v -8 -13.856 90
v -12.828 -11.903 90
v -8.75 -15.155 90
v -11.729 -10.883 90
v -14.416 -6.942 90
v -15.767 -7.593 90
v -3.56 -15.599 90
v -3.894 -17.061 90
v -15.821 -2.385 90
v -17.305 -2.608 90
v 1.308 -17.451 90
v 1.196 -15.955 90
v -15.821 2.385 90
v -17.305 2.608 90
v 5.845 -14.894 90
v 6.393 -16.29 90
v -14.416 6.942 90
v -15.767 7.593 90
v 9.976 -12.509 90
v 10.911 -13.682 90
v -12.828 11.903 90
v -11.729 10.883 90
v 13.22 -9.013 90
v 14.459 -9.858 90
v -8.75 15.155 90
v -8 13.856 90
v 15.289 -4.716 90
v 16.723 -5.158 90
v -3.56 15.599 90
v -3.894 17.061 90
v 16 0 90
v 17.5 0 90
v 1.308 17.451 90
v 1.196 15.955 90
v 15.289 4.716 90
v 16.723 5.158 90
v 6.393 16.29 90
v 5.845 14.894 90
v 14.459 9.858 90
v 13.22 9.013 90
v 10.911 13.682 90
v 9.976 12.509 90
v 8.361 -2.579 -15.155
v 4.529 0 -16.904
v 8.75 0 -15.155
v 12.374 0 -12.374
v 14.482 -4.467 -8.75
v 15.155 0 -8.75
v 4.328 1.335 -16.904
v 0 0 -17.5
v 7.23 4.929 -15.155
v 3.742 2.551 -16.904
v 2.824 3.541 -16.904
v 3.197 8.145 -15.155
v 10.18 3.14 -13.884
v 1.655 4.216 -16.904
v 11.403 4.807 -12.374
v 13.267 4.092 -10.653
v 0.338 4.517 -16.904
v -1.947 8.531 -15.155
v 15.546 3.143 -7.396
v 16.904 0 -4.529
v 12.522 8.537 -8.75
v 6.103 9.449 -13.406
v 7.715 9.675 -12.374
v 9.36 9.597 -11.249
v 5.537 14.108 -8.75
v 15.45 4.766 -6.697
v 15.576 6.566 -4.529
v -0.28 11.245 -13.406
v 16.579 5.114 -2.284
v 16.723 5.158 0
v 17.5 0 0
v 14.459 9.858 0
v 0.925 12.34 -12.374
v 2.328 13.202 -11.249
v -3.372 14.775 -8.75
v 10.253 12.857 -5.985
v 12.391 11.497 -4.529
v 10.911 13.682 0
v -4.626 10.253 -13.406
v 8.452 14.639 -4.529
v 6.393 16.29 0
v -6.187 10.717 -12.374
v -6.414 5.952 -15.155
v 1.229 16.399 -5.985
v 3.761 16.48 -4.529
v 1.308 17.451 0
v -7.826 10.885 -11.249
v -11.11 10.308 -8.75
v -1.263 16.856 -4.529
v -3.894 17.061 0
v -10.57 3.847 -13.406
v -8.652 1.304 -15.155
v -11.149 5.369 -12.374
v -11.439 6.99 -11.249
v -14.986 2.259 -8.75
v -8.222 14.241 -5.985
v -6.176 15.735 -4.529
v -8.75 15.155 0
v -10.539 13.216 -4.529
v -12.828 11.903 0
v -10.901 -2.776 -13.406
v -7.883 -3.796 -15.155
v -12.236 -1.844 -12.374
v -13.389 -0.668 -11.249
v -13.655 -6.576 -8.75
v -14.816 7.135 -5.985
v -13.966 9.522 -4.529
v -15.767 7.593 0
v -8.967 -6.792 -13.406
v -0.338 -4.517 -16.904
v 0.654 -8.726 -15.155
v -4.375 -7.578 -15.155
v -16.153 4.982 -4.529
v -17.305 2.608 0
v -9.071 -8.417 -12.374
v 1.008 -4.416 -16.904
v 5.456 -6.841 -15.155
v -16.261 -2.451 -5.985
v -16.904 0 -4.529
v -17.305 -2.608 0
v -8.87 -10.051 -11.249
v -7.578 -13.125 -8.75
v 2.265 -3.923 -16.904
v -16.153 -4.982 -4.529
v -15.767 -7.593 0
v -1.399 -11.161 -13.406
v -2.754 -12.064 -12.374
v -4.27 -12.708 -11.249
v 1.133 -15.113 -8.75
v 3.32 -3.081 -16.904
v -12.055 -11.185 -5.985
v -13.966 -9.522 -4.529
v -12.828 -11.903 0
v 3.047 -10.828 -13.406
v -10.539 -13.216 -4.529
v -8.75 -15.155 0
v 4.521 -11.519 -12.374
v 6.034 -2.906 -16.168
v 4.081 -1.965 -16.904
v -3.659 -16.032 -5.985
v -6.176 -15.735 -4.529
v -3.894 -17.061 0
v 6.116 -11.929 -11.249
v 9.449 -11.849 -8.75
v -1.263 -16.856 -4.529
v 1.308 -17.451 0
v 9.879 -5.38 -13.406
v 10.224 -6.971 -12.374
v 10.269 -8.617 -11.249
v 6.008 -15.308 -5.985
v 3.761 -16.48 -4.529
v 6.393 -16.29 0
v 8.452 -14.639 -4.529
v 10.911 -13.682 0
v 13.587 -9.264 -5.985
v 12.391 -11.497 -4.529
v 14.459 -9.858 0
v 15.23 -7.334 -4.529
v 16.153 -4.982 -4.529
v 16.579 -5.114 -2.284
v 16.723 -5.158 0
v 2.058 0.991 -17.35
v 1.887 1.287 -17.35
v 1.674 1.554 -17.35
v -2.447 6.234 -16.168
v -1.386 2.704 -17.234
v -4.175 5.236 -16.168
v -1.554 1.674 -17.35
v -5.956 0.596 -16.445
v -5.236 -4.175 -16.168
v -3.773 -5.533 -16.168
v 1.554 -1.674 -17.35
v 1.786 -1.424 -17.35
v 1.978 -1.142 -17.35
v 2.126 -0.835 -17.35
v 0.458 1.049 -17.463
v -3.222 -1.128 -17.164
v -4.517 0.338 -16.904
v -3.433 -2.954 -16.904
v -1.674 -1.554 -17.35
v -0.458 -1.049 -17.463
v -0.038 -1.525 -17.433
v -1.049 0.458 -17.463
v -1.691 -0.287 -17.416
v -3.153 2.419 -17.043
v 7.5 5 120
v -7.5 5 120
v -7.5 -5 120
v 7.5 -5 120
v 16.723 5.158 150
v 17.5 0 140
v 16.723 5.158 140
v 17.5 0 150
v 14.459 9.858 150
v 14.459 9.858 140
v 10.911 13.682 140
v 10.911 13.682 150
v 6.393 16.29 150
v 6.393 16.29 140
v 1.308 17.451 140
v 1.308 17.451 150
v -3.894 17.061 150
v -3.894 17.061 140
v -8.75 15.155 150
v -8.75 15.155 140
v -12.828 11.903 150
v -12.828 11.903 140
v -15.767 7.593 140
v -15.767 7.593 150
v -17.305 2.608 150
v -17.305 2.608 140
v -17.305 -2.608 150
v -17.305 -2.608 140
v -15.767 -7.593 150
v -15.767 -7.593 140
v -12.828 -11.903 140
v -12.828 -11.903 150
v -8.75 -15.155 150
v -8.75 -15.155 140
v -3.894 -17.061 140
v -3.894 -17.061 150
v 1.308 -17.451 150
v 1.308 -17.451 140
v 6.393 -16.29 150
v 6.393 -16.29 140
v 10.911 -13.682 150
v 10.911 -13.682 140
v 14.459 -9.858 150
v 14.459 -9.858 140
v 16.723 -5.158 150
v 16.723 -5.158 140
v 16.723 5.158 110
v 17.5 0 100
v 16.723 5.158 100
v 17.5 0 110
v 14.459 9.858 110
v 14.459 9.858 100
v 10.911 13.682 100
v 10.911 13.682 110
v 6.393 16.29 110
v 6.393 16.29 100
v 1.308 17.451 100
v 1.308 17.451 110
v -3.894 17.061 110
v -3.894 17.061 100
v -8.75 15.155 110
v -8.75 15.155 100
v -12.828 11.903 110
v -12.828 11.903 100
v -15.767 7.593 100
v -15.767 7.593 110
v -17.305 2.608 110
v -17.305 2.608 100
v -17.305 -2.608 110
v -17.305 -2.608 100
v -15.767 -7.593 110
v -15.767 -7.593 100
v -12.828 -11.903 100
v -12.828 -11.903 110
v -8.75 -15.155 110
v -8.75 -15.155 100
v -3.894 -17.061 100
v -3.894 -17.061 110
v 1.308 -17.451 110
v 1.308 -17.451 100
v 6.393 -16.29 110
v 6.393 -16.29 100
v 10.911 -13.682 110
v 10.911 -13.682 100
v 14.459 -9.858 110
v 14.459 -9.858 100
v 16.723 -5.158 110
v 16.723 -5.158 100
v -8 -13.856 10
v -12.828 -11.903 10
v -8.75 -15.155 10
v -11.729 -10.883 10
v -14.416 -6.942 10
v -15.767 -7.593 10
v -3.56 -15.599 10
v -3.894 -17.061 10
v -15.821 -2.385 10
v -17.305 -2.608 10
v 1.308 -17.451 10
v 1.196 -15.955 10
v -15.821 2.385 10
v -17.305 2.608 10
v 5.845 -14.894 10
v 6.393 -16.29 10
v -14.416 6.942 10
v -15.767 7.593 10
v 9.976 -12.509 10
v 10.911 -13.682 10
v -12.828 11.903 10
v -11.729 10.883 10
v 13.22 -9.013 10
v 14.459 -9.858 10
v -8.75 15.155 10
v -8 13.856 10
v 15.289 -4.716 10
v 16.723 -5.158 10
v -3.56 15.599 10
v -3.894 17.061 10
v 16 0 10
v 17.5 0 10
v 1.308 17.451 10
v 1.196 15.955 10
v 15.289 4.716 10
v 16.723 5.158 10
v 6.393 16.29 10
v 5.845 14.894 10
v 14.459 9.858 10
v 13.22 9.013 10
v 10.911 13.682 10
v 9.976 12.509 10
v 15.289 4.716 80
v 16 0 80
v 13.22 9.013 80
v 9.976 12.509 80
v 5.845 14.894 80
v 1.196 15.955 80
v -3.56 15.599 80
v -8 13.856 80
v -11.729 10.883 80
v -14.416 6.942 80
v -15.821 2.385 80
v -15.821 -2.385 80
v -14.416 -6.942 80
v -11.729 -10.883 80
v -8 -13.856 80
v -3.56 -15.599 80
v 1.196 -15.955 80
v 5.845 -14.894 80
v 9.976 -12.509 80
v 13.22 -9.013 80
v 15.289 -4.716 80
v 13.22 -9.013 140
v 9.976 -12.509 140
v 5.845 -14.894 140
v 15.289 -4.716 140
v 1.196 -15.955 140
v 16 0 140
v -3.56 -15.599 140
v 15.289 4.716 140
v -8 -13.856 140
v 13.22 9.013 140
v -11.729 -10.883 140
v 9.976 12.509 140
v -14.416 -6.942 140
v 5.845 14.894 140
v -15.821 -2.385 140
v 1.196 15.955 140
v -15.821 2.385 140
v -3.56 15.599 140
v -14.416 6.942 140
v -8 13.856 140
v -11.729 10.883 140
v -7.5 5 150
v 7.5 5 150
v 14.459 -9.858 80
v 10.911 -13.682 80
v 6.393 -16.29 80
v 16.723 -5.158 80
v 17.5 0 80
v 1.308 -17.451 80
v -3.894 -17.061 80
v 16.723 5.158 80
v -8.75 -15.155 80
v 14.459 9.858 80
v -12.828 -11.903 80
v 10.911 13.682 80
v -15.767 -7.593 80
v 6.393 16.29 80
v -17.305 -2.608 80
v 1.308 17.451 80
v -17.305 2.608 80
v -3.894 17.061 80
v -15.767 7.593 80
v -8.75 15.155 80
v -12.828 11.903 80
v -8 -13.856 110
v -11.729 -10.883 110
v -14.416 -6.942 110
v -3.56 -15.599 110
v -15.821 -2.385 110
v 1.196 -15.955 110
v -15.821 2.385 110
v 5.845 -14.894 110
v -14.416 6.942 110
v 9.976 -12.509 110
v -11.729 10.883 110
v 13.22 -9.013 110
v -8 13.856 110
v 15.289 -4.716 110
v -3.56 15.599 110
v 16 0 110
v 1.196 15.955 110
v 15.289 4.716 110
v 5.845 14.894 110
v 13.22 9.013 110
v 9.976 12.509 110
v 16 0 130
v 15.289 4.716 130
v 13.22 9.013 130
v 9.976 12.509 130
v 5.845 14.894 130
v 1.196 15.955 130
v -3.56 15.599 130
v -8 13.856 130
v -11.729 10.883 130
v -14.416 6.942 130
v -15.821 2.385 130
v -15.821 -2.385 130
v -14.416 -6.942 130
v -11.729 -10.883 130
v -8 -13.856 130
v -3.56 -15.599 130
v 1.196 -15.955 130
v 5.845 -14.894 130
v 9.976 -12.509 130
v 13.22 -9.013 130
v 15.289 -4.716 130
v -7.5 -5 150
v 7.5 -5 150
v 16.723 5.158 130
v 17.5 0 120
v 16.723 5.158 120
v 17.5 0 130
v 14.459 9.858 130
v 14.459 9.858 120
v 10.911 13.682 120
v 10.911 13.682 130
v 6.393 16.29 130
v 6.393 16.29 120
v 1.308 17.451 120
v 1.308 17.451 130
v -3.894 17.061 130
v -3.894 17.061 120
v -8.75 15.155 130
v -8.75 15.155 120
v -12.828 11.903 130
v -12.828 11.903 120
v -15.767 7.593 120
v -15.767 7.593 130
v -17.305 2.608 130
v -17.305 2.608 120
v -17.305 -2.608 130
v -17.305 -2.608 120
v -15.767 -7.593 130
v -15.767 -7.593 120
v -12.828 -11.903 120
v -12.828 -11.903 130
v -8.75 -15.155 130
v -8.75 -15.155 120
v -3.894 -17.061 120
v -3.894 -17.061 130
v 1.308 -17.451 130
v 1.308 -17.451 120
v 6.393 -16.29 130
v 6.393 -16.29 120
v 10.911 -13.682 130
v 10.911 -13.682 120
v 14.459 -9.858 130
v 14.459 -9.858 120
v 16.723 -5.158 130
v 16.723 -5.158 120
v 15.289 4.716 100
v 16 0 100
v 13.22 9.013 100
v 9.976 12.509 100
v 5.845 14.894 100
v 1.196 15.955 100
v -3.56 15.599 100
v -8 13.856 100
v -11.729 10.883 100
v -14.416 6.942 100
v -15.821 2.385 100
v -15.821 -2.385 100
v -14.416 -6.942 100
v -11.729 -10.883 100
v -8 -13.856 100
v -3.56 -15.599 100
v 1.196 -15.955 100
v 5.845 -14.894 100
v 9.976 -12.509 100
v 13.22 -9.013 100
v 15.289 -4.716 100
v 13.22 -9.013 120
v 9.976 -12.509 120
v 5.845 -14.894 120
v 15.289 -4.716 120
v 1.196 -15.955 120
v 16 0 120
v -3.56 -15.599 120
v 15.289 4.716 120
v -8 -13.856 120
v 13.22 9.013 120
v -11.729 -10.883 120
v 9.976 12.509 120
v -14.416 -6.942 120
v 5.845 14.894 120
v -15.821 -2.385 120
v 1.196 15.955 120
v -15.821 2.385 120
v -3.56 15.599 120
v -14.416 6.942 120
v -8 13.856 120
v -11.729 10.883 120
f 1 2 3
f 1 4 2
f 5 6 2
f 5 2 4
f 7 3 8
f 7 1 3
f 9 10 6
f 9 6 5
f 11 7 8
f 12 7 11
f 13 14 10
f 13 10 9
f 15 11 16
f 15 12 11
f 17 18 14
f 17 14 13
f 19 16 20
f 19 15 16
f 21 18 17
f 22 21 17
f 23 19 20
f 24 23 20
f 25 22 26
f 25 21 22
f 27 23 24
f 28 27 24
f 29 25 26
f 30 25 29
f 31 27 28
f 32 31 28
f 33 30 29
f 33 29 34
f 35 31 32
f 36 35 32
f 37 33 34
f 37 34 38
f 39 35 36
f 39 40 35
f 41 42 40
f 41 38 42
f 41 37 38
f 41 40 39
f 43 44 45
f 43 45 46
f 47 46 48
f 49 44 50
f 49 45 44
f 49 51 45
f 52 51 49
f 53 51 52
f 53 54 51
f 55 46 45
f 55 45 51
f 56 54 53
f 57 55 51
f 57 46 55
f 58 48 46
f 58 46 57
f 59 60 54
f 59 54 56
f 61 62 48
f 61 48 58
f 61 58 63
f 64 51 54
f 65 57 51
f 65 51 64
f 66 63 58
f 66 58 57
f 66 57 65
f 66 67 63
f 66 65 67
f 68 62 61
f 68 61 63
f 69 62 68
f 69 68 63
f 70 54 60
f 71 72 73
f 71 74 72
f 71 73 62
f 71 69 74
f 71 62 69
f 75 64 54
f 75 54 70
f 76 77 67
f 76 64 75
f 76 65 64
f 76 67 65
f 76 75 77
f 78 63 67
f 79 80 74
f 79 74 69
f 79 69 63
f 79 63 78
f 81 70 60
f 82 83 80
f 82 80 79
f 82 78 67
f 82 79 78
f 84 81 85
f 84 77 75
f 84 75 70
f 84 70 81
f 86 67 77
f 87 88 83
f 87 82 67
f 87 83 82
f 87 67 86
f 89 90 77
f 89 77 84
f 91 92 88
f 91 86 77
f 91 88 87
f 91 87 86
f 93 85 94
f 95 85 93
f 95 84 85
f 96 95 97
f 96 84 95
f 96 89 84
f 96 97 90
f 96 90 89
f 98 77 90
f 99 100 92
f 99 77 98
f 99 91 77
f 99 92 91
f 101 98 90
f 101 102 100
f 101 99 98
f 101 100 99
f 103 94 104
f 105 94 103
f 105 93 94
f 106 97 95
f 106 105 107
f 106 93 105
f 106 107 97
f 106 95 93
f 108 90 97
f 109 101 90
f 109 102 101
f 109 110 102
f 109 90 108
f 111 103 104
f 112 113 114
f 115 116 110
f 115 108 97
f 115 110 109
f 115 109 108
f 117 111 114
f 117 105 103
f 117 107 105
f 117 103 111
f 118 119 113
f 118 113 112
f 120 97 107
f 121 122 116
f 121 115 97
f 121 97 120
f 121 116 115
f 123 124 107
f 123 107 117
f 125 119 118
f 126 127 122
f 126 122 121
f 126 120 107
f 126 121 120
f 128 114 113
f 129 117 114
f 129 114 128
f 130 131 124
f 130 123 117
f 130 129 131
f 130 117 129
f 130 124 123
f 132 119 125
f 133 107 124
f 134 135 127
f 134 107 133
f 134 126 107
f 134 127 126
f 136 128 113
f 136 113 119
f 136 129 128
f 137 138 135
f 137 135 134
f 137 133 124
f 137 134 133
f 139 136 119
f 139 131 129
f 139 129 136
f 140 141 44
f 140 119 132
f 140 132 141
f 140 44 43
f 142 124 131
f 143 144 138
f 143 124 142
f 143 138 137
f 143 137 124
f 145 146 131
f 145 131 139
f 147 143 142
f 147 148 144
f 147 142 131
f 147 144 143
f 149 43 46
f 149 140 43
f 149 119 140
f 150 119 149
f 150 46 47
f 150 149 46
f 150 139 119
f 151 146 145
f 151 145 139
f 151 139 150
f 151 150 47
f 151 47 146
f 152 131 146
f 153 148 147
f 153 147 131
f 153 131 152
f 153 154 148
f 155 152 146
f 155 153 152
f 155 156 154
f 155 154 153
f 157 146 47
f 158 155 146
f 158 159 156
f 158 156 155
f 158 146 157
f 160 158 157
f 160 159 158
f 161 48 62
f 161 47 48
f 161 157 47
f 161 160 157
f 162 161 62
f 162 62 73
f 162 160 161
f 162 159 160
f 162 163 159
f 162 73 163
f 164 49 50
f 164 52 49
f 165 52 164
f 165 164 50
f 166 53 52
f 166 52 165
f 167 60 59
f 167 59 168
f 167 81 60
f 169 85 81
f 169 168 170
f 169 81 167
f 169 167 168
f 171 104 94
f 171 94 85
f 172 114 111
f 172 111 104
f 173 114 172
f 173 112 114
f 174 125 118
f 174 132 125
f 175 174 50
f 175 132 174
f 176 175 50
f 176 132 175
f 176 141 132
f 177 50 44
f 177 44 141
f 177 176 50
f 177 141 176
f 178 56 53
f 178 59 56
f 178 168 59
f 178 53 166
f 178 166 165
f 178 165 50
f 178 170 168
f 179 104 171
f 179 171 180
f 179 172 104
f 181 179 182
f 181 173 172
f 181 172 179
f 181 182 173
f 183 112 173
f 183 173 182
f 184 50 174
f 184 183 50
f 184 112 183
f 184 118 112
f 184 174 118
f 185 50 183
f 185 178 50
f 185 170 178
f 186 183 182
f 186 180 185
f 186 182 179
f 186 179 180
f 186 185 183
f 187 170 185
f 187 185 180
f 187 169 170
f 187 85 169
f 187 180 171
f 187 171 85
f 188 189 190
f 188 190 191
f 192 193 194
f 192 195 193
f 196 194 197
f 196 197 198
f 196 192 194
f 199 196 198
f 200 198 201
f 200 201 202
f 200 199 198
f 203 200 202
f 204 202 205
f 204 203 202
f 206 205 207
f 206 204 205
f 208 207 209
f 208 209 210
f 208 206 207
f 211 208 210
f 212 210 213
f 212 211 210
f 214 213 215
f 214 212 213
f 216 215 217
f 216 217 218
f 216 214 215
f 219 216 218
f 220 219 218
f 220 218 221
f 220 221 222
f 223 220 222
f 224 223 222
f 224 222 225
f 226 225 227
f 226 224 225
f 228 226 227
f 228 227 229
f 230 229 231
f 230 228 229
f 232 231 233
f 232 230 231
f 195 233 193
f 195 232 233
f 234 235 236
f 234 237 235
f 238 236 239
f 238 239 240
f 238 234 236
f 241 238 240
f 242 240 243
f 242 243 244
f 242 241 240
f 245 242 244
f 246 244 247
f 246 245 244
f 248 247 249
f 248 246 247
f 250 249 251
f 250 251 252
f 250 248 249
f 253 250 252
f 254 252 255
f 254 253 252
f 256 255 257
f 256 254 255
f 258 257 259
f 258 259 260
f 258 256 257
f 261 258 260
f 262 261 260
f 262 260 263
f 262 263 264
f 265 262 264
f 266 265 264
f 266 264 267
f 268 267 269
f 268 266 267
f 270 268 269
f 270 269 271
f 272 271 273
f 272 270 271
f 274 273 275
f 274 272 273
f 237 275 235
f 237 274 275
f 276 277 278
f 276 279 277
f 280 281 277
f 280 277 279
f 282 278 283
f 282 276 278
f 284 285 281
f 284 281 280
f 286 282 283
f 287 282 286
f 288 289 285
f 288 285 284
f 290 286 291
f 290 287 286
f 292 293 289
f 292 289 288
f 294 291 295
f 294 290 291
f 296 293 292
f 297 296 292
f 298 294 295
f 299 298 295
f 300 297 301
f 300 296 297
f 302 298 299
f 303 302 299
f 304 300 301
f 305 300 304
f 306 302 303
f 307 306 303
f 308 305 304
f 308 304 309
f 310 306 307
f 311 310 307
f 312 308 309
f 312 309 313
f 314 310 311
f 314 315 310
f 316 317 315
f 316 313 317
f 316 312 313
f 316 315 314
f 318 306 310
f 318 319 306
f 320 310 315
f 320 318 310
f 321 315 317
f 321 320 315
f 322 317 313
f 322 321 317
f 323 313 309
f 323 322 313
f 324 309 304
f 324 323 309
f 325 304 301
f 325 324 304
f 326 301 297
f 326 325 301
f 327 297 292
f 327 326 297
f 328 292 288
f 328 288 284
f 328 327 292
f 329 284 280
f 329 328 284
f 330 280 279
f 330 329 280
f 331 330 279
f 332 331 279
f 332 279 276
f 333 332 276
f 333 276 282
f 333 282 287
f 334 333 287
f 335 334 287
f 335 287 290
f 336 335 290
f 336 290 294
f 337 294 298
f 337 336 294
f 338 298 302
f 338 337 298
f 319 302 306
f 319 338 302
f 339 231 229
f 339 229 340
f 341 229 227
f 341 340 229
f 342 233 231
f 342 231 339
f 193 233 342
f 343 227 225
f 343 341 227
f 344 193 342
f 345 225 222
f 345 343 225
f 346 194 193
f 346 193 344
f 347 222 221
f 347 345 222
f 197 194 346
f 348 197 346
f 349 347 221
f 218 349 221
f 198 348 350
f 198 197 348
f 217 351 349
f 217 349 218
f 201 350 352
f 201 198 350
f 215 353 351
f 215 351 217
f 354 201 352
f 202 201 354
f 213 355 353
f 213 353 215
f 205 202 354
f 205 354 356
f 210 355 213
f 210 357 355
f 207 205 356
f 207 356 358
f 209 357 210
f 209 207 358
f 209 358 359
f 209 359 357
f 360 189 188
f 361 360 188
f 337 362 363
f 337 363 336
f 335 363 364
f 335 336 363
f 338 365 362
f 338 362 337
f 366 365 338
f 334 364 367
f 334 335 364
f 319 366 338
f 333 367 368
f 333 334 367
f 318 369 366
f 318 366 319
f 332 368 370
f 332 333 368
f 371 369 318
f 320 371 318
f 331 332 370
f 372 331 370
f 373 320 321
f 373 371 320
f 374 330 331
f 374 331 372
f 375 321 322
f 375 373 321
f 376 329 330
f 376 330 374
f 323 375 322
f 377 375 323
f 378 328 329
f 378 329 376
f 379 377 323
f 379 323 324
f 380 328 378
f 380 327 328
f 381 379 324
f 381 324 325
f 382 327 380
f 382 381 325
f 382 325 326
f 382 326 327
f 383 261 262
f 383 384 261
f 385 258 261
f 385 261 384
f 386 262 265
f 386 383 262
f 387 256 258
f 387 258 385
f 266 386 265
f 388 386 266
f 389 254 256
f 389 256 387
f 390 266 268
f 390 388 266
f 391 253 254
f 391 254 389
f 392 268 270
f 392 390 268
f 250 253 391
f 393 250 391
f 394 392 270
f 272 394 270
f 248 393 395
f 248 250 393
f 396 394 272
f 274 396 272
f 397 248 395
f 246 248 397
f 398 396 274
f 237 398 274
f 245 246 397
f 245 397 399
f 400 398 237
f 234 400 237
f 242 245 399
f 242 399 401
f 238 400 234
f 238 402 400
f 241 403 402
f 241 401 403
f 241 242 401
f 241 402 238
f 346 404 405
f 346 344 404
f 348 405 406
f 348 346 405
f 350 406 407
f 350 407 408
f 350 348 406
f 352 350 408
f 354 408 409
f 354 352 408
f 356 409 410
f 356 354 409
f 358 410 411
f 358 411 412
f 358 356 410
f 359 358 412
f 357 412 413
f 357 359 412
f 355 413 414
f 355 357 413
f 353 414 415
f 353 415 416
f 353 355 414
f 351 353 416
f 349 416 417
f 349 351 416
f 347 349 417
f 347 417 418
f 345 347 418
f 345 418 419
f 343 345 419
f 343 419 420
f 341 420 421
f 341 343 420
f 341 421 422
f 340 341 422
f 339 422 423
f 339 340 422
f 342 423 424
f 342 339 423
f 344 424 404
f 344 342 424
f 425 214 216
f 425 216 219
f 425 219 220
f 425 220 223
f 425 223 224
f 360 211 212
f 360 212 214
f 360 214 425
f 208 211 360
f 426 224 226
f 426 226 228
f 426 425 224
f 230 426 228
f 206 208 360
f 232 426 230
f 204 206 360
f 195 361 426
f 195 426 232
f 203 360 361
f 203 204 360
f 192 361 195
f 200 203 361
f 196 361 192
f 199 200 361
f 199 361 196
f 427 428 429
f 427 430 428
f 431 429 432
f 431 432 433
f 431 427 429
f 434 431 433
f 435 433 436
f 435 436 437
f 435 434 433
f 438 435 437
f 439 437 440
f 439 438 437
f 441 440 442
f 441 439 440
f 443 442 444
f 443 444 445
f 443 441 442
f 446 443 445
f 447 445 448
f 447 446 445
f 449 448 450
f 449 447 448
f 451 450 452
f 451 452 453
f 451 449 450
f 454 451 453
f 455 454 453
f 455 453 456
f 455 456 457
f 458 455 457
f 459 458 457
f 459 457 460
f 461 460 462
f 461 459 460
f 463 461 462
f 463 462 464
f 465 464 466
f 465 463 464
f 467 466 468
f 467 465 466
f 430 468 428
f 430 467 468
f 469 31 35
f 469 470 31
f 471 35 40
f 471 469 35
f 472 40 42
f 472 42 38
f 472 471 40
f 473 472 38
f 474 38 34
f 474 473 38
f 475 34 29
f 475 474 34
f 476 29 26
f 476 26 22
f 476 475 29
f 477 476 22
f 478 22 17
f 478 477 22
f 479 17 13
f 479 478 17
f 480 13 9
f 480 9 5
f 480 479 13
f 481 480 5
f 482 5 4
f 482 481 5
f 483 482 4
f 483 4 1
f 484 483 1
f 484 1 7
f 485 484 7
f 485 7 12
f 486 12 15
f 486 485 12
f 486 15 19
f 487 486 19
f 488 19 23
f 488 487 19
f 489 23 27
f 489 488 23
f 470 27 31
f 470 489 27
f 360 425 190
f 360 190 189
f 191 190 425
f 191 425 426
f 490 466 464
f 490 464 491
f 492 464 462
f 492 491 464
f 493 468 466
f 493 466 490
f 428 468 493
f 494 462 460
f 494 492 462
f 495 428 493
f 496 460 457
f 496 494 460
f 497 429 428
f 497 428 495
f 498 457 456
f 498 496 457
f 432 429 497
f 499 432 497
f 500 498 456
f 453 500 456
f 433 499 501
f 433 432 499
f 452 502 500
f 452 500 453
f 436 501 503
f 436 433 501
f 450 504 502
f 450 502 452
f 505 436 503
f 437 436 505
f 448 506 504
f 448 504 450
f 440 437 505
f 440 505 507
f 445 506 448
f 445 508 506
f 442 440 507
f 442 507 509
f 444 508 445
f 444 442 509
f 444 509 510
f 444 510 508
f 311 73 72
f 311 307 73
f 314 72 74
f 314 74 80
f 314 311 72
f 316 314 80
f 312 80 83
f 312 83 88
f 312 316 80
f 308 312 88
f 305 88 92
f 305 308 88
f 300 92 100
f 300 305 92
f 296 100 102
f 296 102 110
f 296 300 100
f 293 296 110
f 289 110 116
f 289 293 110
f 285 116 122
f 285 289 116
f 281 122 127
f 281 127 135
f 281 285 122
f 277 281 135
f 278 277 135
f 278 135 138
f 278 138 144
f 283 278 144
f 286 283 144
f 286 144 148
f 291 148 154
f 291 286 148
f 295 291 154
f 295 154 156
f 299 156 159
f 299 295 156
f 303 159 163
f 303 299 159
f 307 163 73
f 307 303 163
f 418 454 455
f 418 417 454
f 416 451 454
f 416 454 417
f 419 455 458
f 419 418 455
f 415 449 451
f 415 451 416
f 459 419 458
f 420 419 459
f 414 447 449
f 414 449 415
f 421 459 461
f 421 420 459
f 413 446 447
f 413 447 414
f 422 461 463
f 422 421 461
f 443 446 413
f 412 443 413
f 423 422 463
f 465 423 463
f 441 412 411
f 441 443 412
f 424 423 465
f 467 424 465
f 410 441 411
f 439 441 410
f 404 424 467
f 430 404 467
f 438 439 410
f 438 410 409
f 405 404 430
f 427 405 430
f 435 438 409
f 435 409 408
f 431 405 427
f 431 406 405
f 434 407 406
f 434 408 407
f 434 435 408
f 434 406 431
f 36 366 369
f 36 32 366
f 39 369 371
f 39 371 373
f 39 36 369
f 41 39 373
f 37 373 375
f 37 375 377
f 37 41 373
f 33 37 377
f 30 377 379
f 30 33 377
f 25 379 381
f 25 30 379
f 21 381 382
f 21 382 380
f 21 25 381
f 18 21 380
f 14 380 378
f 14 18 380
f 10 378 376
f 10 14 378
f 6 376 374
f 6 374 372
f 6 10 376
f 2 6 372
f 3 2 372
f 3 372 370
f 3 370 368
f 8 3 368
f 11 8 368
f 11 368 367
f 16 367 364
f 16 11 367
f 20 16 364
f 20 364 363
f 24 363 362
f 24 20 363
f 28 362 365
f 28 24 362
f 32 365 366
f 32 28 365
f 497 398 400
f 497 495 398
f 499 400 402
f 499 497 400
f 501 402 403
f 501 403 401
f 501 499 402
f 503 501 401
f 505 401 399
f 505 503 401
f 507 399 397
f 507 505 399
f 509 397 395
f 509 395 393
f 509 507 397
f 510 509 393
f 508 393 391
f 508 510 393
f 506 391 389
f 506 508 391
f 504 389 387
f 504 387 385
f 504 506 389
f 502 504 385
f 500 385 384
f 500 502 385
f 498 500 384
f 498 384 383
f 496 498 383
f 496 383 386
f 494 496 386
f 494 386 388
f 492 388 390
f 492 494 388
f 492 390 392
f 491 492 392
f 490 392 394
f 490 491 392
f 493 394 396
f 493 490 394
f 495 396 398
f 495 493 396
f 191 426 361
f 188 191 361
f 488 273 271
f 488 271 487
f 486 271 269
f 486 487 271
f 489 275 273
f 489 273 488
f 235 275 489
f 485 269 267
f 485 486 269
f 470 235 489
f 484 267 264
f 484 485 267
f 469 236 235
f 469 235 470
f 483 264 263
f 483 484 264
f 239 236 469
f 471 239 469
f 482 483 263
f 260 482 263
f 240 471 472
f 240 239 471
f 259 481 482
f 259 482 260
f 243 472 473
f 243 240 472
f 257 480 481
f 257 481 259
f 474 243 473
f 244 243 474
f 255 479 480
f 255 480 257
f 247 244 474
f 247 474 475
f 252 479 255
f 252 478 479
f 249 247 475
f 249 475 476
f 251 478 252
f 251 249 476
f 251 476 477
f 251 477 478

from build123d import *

# Parameters (mm, degrees)
F2_W     = 15
F2_H     = 10
F3_DEPTH = 30


with BuildPart() as f1:
    # F0 (on Front) → F1 (revolve)
    with BuildSketch(Plane.XZ):
        with BuildLine():
            Line((17.5, 0), (0, 0))
            Line((0, 0), (0, -17.5))
            ThreePointArc((0, -17.5), (12.374369, -12.374369), (17.5, 0))
        make_face()
        Polygon((0, 150), (0, 0), (17.5, 0), (17.5, 10), (16, 10), (16, 80), (17.5, 80), (17.5, 90), (16, 90), (16, 100), (17.5, 100), (17.5, 110), (16, 110), (16, 120), (17.5, 120), (17.5, 130), (16, 130), (16, 140), (17.5, 140), (17.5, 150), align=None)
    revolve(axis=Axis((0, 0, 75), (0, 0, 1)))

    # F2 (on face) → F3 (cut)
    with BuildSketch(Plane.XY.offset(150)):
        Rectangle(F2_W, F2_H)
    extrude(amount=-F3_DEPTH, mode=Mode.SUBTRACT)


solid = f1.part
